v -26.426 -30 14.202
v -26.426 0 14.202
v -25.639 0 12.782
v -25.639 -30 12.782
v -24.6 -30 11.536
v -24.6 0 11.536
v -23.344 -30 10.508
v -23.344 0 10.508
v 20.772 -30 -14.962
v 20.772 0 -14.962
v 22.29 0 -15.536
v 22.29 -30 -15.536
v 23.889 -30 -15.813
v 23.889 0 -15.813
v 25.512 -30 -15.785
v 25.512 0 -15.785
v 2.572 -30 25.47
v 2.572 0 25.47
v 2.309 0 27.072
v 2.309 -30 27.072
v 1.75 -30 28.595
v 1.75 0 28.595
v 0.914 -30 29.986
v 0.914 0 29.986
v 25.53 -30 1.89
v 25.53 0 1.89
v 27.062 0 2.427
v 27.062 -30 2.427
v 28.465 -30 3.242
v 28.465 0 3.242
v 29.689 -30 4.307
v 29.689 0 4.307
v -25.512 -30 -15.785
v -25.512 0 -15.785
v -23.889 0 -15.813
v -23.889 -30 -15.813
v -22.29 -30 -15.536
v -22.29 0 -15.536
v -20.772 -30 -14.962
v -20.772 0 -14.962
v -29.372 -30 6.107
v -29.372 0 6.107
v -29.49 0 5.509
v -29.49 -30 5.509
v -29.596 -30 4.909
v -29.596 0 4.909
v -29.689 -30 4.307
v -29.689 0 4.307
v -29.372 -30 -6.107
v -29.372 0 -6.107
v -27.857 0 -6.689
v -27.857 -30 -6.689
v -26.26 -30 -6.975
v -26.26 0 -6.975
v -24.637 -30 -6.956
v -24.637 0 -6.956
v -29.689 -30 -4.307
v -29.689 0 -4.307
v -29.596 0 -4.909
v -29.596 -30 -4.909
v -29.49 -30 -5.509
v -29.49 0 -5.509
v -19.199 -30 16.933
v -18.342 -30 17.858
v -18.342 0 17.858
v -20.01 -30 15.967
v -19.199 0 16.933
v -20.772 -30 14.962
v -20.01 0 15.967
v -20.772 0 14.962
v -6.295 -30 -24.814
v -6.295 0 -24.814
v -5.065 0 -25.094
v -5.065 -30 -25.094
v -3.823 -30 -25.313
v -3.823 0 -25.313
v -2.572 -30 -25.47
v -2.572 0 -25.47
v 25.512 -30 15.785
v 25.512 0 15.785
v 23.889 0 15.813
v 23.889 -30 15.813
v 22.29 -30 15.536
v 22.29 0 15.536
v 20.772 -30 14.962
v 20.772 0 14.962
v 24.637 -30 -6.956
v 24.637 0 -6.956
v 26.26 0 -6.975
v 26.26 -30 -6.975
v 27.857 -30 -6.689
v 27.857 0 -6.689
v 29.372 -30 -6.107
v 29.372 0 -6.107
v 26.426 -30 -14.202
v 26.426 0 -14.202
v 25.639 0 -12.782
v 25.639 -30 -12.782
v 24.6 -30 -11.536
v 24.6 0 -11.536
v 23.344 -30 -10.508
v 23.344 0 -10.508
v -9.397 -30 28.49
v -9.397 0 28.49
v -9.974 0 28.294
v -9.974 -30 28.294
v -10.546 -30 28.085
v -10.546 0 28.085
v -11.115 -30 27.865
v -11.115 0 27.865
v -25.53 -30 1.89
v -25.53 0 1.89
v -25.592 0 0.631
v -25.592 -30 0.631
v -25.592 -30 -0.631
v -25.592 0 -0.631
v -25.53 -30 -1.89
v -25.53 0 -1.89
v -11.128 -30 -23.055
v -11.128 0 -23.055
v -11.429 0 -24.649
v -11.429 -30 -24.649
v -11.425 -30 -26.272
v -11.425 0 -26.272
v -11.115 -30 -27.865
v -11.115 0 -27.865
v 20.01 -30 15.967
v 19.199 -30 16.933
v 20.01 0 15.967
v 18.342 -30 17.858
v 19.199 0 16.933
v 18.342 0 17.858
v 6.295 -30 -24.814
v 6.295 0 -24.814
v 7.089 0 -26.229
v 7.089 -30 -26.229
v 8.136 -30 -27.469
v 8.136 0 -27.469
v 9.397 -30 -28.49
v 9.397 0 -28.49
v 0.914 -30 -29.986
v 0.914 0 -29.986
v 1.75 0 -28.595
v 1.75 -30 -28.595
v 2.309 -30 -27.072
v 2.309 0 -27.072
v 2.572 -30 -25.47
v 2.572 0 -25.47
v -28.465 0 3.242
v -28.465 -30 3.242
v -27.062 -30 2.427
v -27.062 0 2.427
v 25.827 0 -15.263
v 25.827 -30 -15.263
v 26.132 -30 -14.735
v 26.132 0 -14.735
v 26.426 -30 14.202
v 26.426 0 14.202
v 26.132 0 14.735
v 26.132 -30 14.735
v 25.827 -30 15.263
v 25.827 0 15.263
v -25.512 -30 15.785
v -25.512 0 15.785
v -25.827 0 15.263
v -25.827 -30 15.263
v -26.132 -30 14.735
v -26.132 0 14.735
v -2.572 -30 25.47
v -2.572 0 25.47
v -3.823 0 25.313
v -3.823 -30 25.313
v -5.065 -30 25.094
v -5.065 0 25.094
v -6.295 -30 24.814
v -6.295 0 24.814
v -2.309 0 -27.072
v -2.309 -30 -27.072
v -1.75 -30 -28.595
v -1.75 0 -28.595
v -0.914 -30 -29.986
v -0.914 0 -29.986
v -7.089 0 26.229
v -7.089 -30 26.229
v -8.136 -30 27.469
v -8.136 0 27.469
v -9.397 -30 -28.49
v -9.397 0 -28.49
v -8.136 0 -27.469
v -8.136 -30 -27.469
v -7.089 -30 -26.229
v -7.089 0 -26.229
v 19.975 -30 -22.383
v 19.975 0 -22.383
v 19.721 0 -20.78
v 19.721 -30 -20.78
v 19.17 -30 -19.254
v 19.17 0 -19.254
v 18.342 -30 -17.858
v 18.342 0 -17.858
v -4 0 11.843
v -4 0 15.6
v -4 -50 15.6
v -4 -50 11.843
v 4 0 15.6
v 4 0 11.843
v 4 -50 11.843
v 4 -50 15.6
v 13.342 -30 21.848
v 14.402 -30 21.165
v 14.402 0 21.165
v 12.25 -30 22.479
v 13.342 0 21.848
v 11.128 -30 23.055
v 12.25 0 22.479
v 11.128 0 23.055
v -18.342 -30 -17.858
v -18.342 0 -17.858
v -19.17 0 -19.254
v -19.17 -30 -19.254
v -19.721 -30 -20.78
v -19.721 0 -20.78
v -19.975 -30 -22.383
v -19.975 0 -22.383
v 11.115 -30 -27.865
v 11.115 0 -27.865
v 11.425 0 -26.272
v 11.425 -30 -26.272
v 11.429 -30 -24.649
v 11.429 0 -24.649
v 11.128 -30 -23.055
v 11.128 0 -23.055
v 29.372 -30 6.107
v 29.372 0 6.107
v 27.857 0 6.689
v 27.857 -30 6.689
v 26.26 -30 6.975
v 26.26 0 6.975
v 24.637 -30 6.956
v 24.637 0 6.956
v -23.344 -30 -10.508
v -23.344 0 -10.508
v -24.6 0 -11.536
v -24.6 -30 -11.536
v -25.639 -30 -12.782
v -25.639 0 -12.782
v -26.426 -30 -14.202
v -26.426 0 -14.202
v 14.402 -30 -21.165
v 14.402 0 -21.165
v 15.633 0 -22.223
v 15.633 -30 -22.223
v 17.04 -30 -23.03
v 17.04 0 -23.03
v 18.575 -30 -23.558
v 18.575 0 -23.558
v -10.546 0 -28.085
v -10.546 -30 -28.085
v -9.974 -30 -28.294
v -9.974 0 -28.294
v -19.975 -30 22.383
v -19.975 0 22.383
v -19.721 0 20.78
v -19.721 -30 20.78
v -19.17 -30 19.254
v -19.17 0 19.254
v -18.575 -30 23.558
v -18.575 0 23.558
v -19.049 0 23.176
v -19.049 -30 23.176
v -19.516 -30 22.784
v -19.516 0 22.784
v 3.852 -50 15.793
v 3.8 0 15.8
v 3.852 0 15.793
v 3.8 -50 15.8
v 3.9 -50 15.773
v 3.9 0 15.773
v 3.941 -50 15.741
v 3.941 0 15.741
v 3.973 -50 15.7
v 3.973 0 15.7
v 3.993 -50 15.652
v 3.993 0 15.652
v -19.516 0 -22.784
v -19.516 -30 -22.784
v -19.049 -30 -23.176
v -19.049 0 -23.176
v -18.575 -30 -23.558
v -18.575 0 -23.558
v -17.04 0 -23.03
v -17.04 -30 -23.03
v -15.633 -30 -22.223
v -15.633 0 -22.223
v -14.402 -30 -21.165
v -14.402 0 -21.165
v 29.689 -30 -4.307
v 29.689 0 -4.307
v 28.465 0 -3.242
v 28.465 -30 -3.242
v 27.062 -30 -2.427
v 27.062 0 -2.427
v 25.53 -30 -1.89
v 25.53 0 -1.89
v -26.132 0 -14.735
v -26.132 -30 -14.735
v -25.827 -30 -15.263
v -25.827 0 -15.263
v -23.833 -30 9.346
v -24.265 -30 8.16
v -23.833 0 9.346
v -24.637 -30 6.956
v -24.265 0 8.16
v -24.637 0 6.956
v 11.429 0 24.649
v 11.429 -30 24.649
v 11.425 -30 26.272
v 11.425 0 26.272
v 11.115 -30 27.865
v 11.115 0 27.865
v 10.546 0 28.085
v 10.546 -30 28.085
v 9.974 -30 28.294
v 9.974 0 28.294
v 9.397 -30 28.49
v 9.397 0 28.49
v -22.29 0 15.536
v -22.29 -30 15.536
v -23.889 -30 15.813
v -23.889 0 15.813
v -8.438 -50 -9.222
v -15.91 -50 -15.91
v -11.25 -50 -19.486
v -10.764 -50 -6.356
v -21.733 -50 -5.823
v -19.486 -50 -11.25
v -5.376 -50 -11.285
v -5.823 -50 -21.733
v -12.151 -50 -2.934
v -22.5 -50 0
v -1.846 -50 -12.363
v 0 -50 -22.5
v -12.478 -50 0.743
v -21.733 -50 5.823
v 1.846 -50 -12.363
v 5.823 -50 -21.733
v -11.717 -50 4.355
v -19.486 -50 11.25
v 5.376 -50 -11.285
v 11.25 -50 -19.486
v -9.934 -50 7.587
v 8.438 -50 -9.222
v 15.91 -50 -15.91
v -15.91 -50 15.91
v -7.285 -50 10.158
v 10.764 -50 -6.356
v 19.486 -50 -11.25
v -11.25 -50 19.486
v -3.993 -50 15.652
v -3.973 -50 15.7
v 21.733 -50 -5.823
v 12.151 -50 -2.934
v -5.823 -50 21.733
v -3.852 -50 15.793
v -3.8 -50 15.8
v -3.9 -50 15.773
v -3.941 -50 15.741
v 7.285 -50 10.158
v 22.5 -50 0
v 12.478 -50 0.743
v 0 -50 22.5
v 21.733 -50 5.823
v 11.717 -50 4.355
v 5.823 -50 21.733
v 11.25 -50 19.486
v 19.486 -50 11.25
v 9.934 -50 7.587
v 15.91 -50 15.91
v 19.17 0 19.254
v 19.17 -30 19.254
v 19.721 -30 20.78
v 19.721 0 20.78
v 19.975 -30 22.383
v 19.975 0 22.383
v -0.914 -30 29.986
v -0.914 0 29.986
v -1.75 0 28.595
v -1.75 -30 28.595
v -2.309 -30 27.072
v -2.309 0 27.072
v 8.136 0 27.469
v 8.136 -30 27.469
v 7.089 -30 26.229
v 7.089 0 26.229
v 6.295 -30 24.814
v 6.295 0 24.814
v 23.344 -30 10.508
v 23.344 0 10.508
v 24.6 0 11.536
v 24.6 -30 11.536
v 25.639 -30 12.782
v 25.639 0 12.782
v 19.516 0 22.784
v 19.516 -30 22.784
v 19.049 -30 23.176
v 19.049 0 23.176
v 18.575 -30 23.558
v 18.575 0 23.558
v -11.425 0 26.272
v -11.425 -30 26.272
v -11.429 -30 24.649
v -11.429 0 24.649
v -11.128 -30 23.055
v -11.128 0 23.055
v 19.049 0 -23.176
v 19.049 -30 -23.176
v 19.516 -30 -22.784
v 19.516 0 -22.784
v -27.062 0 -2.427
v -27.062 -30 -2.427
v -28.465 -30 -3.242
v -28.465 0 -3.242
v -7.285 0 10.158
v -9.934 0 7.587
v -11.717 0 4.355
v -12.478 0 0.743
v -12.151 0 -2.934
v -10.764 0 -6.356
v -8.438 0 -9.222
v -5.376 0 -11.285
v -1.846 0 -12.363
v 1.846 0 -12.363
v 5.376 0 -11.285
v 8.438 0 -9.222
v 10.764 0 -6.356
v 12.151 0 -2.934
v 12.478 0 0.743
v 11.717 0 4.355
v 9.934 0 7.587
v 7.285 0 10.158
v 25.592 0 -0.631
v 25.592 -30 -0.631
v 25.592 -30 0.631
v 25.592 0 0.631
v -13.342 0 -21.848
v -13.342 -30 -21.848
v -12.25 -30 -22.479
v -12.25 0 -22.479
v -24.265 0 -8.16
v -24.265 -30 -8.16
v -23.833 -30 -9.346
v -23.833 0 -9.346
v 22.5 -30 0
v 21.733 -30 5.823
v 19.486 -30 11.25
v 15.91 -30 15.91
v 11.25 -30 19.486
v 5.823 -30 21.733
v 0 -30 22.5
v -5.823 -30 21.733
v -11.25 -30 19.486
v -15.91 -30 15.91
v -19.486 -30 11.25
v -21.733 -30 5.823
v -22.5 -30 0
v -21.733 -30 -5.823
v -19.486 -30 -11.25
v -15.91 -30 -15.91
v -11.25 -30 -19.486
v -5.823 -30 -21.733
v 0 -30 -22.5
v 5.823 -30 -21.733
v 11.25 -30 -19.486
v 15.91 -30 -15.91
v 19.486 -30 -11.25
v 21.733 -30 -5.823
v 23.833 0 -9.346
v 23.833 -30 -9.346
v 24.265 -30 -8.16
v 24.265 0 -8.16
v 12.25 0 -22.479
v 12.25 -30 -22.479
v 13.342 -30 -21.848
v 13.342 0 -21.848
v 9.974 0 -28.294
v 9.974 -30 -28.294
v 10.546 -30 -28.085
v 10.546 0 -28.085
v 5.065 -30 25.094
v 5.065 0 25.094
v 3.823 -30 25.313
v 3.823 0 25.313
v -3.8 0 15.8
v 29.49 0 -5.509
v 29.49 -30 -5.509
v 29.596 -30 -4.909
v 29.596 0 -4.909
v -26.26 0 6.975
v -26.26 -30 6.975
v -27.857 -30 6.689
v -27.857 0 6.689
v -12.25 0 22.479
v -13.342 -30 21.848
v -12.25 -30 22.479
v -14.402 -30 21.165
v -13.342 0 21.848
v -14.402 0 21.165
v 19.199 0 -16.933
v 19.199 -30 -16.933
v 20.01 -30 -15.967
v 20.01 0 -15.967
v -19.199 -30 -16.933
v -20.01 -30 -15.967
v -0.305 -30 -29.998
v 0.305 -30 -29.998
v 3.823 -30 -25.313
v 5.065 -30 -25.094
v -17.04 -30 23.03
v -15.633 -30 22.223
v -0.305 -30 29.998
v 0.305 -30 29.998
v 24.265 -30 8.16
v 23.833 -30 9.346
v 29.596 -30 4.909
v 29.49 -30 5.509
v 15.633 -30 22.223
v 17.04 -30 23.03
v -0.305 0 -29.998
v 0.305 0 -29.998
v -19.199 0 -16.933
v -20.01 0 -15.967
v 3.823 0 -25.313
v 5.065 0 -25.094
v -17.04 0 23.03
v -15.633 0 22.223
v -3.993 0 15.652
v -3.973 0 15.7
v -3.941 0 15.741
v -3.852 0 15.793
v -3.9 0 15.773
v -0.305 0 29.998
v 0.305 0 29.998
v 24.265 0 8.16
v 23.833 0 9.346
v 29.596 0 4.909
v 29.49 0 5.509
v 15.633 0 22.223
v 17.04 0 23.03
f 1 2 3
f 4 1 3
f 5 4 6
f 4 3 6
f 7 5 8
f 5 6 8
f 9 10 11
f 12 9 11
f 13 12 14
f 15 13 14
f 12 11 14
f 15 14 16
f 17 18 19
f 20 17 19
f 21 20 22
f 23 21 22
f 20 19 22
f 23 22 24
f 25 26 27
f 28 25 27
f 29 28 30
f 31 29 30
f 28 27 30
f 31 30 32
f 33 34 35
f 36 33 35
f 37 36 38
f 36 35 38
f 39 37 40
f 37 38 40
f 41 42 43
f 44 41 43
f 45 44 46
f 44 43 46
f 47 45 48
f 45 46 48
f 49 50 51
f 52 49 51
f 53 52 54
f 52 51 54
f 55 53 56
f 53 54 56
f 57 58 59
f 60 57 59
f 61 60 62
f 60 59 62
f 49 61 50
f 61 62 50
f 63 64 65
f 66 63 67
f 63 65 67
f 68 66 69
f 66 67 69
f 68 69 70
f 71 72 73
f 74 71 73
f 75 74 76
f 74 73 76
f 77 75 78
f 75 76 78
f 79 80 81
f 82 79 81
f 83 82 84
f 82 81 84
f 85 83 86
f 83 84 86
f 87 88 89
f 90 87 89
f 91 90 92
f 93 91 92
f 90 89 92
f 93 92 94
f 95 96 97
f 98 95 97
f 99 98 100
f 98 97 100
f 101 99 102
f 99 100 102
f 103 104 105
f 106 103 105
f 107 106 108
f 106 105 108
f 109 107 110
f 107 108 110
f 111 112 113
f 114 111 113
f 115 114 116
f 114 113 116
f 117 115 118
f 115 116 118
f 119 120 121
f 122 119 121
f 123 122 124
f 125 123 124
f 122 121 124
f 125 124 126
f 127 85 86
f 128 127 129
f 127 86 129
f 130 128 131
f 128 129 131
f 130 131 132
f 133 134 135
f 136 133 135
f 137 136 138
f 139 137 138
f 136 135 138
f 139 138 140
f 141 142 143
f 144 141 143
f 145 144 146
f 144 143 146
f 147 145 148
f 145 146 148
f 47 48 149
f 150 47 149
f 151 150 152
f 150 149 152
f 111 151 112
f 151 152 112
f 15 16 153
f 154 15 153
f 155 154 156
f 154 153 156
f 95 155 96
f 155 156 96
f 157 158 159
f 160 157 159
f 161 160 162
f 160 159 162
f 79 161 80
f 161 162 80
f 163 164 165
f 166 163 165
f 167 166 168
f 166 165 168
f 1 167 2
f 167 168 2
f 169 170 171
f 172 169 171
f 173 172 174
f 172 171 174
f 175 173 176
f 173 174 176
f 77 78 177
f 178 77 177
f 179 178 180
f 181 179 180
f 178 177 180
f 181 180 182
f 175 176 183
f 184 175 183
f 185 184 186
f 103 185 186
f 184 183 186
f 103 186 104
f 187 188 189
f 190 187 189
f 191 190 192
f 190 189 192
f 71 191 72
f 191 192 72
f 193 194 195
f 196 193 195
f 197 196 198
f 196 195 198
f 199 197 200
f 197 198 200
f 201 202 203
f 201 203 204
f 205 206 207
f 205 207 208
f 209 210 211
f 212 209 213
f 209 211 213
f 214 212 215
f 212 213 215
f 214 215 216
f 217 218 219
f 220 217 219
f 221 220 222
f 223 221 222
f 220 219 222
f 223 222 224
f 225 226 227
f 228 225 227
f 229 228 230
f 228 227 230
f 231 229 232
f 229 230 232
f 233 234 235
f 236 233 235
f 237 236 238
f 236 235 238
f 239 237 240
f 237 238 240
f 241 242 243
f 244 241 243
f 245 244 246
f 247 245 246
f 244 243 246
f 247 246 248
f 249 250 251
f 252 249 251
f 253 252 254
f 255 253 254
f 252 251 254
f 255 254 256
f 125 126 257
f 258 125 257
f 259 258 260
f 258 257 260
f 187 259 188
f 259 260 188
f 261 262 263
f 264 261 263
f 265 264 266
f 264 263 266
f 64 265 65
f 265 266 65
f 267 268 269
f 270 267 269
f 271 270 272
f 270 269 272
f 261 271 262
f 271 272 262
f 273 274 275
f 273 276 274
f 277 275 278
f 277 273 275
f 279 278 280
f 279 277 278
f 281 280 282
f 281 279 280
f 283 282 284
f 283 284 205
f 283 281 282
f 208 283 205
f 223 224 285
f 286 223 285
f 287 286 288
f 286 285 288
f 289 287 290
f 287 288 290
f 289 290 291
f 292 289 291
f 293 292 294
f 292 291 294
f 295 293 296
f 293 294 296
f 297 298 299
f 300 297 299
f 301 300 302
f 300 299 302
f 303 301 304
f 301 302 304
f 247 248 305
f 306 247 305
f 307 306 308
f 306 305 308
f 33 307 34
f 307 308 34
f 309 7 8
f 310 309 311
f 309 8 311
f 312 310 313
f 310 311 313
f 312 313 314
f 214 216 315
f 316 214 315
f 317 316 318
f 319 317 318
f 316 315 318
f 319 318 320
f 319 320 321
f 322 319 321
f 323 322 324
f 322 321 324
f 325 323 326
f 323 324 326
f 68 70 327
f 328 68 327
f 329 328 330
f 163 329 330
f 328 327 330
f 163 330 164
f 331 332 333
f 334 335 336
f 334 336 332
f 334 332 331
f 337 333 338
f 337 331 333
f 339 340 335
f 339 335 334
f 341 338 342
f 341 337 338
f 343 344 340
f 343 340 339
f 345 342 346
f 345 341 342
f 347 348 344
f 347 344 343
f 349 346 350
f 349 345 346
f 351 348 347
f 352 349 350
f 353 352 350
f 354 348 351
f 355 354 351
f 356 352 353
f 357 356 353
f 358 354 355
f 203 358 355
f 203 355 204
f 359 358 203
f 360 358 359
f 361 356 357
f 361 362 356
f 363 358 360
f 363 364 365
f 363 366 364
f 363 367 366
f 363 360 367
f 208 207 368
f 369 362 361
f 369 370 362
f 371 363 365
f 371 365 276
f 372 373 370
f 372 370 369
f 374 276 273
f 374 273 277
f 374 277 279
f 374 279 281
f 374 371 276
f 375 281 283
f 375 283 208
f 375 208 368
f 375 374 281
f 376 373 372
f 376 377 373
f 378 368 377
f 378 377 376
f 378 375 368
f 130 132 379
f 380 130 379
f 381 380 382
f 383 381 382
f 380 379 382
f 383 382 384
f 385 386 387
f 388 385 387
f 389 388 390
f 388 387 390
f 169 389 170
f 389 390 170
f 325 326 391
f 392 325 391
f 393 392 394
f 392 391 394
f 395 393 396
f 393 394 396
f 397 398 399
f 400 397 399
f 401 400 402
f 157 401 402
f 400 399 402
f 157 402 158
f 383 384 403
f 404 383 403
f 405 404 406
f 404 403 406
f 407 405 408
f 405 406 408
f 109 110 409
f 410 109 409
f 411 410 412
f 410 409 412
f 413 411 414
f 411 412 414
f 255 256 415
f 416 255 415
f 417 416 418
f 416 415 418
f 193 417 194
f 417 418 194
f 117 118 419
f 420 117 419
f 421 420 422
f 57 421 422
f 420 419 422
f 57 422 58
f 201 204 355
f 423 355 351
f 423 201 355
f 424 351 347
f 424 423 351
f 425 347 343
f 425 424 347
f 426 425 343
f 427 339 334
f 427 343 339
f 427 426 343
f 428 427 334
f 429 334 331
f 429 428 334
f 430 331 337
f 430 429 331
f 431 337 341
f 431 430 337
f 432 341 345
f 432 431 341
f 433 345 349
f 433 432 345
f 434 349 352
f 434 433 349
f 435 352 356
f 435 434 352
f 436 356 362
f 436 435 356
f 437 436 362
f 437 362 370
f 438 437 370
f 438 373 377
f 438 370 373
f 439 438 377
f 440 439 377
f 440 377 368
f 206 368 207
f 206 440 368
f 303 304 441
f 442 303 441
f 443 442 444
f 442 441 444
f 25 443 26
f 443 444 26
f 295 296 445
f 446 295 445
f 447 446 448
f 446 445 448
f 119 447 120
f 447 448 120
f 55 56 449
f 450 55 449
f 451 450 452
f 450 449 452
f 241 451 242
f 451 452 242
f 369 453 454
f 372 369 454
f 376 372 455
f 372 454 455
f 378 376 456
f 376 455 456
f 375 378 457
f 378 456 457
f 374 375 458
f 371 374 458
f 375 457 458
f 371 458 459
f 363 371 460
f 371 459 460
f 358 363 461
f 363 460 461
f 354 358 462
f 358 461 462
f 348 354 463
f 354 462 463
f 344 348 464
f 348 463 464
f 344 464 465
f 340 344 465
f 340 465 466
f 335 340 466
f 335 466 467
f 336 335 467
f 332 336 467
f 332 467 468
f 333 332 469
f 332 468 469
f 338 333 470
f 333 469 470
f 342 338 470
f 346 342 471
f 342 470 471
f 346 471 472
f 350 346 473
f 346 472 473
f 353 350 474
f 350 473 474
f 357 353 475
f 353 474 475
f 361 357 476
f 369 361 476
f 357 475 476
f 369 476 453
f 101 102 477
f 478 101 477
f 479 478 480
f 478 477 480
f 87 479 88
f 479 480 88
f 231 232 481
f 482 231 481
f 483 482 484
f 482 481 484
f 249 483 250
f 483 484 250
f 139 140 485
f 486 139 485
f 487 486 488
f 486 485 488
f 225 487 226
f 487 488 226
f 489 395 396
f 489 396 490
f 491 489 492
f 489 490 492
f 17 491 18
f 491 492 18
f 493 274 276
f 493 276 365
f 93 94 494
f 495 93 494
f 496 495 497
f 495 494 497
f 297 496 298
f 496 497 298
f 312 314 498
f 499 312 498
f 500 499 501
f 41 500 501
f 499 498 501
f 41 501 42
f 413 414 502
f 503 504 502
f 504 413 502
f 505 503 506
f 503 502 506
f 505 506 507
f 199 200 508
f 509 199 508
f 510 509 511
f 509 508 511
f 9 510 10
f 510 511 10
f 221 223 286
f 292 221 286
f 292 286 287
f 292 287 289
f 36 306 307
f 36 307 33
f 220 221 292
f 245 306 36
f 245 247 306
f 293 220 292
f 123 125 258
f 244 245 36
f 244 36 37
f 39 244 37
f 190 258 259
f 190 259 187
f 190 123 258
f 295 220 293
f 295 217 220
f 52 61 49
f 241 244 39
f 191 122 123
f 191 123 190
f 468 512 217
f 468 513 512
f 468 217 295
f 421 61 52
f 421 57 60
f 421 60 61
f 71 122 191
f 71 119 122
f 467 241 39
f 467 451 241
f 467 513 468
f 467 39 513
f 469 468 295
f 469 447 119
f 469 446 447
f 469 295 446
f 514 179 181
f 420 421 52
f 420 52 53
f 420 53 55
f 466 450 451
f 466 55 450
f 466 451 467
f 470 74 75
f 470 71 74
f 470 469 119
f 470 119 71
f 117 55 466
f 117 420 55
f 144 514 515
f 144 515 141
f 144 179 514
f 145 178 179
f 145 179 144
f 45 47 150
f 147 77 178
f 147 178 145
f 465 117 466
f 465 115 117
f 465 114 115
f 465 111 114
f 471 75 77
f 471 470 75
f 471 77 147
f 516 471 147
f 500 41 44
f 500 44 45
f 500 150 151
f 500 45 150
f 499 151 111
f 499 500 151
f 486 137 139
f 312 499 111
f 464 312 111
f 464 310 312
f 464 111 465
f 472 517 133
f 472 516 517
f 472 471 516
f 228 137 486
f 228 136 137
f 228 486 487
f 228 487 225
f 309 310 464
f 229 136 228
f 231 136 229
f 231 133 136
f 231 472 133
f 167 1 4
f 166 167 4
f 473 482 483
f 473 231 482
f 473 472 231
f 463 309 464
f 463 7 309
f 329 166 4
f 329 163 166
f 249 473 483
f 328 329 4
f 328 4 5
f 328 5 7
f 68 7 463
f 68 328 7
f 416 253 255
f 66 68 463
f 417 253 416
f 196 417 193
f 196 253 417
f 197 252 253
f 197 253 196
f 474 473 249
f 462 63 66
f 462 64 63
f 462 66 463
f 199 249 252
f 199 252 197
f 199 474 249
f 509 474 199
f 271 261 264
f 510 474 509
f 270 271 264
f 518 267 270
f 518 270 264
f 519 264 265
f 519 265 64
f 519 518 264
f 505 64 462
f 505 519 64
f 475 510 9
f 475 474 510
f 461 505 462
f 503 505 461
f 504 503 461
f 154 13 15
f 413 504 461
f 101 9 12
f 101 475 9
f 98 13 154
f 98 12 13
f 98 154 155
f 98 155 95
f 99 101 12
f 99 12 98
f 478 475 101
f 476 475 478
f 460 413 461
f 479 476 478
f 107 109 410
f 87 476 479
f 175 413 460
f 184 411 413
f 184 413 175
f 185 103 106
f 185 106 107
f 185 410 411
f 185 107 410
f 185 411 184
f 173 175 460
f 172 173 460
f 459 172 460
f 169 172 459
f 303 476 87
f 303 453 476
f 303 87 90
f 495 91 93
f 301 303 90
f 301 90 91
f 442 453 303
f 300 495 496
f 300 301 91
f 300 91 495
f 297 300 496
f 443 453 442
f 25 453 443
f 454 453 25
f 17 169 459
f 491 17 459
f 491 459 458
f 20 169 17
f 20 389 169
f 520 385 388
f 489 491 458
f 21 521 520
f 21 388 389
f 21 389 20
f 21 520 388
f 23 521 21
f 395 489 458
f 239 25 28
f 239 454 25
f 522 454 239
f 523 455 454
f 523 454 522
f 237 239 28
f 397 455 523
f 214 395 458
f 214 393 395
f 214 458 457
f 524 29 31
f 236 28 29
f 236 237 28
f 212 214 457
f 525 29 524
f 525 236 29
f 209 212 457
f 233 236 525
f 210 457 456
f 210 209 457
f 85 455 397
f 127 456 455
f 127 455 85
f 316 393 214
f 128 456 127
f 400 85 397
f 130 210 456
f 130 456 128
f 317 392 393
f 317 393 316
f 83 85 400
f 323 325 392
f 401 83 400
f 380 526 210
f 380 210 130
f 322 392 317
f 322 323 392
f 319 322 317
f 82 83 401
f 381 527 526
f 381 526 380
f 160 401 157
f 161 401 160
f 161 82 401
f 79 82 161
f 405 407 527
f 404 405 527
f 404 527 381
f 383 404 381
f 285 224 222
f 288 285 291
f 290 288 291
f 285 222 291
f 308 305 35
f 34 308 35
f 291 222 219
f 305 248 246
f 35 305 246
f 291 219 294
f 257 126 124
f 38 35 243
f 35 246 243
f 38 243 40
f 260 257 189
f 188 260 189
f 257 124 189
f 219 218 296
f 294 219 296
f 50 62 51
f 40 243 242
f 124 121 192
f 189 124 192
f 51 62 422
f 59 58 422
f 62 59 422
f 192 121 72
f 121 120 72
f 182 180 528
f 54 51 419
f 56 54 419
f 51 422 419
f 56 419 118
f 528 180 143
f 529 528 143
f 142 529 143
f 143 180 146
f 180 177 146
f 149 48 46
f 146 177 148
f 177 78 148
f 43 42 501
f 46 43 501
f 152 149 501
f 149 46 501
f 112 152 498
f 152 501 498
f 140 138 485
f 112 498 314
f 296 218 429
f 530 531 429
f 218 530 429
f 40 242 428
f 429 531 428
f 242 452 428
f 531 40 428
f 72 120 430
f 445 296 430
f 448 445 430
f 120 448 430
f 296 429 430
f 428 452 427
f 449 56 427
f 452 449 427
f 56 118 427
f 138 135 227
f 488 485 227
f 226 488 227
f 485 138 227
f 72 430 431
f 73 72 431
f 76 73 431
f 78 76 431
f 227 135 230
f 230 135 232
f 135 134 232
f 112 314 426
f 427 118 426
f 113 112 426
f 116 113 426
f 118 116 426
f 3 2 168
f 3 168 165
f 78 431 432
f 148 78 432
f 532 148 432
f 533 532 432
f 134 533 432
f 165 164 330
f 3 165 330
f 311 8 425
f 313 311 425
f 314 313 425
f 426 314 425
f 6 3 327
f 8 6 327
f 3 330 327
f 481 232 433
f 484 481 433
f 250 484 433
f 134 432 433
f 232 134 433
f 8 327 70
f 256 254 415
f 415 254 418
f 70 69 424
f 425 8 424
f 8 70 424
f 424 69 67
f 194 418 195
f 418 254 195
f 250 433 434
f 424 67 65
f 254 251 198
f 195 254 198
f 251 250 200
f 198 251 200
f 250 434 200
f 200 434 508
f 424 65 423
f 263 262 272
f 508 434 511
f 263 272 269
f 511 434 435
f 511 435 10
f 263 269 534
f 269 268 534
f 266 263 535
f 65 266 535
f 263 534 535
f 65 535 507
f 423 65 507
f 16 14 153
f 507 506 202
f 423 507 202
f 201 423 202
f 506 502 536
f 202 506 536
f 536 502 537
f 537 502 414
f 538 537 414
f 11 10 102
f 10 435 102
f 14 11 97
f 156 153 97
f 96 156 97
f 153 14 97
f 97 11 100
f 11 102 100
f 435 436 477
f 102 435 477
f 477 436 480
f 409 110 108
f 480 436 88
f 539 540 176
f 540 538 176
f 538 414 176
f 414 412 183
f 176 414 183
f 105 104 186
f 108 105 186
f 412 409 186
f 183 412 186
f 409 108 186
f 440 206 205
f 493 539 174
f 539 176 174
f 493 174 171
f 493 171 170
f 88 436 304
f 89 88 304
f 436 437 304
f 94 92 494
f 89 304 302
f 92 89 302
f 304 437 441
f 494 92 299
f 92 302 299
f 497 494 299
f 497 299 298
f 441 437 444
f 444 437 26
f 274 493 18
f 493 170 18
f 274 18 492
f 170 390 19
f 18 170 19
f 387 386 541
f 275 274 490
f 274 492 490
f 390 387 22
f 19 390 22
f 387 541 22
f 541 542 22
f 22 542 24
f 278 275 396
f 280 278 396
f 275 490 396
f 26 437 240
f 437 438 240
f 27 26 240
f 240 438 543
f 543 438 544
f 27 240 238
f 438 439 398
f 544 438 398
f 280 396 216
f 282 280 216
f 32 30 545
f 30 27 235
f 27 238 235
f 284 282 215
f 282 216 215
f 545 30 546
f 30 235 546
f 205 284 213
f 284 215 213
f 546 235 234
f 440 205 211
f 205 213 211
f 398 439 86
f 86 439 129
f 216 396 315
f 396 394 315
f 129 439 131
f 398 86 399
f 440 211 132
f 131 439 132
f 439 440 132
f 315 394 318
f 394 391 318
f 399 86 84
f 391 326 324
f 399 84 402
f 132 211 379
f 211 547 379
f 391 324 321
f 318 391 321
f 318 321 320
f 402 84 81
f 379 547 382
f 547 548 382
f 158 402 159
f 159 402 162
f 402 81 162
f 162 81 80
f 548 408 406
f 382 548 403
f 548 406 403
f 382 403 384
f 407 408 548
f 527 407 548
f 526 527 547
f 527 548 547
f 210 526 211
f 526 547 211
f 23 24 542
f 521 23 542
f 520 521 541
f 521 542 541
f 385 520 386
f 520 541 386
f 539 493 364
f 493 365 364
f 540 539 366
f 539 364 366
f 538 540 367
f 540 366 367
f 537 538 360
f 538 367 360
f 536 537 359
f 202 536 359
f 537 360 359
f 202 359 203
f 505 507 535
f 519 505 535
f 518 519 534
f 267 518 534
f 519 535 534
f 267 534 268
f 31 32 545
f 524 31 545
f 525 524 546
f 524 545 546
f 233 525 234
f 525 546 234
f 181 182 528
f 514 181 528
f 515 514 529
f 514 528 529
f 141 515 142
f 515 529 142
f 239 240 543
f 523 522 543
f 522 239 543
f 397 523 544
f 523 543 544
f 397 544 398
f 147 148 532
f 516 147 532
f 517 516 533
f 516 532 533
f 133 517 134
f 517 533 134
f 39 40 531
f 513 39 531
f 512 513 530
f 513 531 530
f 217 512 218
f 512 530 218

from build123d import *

# Parameters (mm, degrees)
F0_R     = 25.6
F1_DEPTH = 30
F3_DEPTH = 30
F4_COUNT = 18
F5_R     = 22.5
F6_DEPTH = 20
F8_DEPTH = 50.001
F9_R     = 0.2


with BuildPart() as f1:
    # F0 (on Front) → F1 (new body)
    with BuildSketch(Plane.XZ):
        Circle(F0_R)
    extrude(amount=F1_DEPTH)

    # F2 (on Front) → F3 (join, through all)
    with BuildSketch(Plane.XZ):
        with BuildLine():
            ThreePointArc((-2.5717175805, 25.4704980062), (0, 25.6), (2.5717175805, 25.4704980062))
            ThreePointArc((2.5717175805, 25.4704980062), (2.0656887709, 27.8468218747), (0.9139195769, 29.9860759521))
            ThreePointArc((0.9139195769, 29.9860759521), (0, 30), (-0.9139195769, 29.9860759521))
            ThreePointArc((-0.9139195769, 29.9860759521), (-2.0656887709, 27.8468218747), (-2.5717175805, 25.4704980062))
        make_face()
    extrude(amount=F3_DEPTH)

    # F4: F1 ×18 about axis
    f4_axis = Axis((0, 0, 0), (0, 1, 0))


with BuildPart() as f1_1:
    add(f1.part)
    for i in range(1, F4_COUNT):
        add(f1.part.rotate(f4_axis, i * 360 / F4_COUNT))

    # F5 (on face) → F6 (join)
    with BuildSketch(Plane.XZ.offset(30)):
        Circle(F5_R)
    extrude(amount=F6_DEPTH)

    # F7 (on Front) → F8 (cut, through all)
    with BuildSketch(Plane.XZ):
        with BuildLine():
            Line((4, 15.8), (-4, 15.8))
            Line((-4, 15.8), (-4, 11.8427192823))
            ThreePointArc((-4, 11.8427192823), (0, -12.5), (4, 11.8427192823))
            Line((4, 11.8427192823), (4, 15.8))
        make_face()
    extrude(amount=F8_DEPTH, mode=Mode.SUBTRACT)

    # F9
    f9_edges = [f1_1.edges().sort_by_distance(p)[0] for p in [
        (-4, -25, 15.8),
        (4, -25, 15.8),
    ]]
    fillet(f9_edges, radius=F9_R)


solid = f1_1.part
